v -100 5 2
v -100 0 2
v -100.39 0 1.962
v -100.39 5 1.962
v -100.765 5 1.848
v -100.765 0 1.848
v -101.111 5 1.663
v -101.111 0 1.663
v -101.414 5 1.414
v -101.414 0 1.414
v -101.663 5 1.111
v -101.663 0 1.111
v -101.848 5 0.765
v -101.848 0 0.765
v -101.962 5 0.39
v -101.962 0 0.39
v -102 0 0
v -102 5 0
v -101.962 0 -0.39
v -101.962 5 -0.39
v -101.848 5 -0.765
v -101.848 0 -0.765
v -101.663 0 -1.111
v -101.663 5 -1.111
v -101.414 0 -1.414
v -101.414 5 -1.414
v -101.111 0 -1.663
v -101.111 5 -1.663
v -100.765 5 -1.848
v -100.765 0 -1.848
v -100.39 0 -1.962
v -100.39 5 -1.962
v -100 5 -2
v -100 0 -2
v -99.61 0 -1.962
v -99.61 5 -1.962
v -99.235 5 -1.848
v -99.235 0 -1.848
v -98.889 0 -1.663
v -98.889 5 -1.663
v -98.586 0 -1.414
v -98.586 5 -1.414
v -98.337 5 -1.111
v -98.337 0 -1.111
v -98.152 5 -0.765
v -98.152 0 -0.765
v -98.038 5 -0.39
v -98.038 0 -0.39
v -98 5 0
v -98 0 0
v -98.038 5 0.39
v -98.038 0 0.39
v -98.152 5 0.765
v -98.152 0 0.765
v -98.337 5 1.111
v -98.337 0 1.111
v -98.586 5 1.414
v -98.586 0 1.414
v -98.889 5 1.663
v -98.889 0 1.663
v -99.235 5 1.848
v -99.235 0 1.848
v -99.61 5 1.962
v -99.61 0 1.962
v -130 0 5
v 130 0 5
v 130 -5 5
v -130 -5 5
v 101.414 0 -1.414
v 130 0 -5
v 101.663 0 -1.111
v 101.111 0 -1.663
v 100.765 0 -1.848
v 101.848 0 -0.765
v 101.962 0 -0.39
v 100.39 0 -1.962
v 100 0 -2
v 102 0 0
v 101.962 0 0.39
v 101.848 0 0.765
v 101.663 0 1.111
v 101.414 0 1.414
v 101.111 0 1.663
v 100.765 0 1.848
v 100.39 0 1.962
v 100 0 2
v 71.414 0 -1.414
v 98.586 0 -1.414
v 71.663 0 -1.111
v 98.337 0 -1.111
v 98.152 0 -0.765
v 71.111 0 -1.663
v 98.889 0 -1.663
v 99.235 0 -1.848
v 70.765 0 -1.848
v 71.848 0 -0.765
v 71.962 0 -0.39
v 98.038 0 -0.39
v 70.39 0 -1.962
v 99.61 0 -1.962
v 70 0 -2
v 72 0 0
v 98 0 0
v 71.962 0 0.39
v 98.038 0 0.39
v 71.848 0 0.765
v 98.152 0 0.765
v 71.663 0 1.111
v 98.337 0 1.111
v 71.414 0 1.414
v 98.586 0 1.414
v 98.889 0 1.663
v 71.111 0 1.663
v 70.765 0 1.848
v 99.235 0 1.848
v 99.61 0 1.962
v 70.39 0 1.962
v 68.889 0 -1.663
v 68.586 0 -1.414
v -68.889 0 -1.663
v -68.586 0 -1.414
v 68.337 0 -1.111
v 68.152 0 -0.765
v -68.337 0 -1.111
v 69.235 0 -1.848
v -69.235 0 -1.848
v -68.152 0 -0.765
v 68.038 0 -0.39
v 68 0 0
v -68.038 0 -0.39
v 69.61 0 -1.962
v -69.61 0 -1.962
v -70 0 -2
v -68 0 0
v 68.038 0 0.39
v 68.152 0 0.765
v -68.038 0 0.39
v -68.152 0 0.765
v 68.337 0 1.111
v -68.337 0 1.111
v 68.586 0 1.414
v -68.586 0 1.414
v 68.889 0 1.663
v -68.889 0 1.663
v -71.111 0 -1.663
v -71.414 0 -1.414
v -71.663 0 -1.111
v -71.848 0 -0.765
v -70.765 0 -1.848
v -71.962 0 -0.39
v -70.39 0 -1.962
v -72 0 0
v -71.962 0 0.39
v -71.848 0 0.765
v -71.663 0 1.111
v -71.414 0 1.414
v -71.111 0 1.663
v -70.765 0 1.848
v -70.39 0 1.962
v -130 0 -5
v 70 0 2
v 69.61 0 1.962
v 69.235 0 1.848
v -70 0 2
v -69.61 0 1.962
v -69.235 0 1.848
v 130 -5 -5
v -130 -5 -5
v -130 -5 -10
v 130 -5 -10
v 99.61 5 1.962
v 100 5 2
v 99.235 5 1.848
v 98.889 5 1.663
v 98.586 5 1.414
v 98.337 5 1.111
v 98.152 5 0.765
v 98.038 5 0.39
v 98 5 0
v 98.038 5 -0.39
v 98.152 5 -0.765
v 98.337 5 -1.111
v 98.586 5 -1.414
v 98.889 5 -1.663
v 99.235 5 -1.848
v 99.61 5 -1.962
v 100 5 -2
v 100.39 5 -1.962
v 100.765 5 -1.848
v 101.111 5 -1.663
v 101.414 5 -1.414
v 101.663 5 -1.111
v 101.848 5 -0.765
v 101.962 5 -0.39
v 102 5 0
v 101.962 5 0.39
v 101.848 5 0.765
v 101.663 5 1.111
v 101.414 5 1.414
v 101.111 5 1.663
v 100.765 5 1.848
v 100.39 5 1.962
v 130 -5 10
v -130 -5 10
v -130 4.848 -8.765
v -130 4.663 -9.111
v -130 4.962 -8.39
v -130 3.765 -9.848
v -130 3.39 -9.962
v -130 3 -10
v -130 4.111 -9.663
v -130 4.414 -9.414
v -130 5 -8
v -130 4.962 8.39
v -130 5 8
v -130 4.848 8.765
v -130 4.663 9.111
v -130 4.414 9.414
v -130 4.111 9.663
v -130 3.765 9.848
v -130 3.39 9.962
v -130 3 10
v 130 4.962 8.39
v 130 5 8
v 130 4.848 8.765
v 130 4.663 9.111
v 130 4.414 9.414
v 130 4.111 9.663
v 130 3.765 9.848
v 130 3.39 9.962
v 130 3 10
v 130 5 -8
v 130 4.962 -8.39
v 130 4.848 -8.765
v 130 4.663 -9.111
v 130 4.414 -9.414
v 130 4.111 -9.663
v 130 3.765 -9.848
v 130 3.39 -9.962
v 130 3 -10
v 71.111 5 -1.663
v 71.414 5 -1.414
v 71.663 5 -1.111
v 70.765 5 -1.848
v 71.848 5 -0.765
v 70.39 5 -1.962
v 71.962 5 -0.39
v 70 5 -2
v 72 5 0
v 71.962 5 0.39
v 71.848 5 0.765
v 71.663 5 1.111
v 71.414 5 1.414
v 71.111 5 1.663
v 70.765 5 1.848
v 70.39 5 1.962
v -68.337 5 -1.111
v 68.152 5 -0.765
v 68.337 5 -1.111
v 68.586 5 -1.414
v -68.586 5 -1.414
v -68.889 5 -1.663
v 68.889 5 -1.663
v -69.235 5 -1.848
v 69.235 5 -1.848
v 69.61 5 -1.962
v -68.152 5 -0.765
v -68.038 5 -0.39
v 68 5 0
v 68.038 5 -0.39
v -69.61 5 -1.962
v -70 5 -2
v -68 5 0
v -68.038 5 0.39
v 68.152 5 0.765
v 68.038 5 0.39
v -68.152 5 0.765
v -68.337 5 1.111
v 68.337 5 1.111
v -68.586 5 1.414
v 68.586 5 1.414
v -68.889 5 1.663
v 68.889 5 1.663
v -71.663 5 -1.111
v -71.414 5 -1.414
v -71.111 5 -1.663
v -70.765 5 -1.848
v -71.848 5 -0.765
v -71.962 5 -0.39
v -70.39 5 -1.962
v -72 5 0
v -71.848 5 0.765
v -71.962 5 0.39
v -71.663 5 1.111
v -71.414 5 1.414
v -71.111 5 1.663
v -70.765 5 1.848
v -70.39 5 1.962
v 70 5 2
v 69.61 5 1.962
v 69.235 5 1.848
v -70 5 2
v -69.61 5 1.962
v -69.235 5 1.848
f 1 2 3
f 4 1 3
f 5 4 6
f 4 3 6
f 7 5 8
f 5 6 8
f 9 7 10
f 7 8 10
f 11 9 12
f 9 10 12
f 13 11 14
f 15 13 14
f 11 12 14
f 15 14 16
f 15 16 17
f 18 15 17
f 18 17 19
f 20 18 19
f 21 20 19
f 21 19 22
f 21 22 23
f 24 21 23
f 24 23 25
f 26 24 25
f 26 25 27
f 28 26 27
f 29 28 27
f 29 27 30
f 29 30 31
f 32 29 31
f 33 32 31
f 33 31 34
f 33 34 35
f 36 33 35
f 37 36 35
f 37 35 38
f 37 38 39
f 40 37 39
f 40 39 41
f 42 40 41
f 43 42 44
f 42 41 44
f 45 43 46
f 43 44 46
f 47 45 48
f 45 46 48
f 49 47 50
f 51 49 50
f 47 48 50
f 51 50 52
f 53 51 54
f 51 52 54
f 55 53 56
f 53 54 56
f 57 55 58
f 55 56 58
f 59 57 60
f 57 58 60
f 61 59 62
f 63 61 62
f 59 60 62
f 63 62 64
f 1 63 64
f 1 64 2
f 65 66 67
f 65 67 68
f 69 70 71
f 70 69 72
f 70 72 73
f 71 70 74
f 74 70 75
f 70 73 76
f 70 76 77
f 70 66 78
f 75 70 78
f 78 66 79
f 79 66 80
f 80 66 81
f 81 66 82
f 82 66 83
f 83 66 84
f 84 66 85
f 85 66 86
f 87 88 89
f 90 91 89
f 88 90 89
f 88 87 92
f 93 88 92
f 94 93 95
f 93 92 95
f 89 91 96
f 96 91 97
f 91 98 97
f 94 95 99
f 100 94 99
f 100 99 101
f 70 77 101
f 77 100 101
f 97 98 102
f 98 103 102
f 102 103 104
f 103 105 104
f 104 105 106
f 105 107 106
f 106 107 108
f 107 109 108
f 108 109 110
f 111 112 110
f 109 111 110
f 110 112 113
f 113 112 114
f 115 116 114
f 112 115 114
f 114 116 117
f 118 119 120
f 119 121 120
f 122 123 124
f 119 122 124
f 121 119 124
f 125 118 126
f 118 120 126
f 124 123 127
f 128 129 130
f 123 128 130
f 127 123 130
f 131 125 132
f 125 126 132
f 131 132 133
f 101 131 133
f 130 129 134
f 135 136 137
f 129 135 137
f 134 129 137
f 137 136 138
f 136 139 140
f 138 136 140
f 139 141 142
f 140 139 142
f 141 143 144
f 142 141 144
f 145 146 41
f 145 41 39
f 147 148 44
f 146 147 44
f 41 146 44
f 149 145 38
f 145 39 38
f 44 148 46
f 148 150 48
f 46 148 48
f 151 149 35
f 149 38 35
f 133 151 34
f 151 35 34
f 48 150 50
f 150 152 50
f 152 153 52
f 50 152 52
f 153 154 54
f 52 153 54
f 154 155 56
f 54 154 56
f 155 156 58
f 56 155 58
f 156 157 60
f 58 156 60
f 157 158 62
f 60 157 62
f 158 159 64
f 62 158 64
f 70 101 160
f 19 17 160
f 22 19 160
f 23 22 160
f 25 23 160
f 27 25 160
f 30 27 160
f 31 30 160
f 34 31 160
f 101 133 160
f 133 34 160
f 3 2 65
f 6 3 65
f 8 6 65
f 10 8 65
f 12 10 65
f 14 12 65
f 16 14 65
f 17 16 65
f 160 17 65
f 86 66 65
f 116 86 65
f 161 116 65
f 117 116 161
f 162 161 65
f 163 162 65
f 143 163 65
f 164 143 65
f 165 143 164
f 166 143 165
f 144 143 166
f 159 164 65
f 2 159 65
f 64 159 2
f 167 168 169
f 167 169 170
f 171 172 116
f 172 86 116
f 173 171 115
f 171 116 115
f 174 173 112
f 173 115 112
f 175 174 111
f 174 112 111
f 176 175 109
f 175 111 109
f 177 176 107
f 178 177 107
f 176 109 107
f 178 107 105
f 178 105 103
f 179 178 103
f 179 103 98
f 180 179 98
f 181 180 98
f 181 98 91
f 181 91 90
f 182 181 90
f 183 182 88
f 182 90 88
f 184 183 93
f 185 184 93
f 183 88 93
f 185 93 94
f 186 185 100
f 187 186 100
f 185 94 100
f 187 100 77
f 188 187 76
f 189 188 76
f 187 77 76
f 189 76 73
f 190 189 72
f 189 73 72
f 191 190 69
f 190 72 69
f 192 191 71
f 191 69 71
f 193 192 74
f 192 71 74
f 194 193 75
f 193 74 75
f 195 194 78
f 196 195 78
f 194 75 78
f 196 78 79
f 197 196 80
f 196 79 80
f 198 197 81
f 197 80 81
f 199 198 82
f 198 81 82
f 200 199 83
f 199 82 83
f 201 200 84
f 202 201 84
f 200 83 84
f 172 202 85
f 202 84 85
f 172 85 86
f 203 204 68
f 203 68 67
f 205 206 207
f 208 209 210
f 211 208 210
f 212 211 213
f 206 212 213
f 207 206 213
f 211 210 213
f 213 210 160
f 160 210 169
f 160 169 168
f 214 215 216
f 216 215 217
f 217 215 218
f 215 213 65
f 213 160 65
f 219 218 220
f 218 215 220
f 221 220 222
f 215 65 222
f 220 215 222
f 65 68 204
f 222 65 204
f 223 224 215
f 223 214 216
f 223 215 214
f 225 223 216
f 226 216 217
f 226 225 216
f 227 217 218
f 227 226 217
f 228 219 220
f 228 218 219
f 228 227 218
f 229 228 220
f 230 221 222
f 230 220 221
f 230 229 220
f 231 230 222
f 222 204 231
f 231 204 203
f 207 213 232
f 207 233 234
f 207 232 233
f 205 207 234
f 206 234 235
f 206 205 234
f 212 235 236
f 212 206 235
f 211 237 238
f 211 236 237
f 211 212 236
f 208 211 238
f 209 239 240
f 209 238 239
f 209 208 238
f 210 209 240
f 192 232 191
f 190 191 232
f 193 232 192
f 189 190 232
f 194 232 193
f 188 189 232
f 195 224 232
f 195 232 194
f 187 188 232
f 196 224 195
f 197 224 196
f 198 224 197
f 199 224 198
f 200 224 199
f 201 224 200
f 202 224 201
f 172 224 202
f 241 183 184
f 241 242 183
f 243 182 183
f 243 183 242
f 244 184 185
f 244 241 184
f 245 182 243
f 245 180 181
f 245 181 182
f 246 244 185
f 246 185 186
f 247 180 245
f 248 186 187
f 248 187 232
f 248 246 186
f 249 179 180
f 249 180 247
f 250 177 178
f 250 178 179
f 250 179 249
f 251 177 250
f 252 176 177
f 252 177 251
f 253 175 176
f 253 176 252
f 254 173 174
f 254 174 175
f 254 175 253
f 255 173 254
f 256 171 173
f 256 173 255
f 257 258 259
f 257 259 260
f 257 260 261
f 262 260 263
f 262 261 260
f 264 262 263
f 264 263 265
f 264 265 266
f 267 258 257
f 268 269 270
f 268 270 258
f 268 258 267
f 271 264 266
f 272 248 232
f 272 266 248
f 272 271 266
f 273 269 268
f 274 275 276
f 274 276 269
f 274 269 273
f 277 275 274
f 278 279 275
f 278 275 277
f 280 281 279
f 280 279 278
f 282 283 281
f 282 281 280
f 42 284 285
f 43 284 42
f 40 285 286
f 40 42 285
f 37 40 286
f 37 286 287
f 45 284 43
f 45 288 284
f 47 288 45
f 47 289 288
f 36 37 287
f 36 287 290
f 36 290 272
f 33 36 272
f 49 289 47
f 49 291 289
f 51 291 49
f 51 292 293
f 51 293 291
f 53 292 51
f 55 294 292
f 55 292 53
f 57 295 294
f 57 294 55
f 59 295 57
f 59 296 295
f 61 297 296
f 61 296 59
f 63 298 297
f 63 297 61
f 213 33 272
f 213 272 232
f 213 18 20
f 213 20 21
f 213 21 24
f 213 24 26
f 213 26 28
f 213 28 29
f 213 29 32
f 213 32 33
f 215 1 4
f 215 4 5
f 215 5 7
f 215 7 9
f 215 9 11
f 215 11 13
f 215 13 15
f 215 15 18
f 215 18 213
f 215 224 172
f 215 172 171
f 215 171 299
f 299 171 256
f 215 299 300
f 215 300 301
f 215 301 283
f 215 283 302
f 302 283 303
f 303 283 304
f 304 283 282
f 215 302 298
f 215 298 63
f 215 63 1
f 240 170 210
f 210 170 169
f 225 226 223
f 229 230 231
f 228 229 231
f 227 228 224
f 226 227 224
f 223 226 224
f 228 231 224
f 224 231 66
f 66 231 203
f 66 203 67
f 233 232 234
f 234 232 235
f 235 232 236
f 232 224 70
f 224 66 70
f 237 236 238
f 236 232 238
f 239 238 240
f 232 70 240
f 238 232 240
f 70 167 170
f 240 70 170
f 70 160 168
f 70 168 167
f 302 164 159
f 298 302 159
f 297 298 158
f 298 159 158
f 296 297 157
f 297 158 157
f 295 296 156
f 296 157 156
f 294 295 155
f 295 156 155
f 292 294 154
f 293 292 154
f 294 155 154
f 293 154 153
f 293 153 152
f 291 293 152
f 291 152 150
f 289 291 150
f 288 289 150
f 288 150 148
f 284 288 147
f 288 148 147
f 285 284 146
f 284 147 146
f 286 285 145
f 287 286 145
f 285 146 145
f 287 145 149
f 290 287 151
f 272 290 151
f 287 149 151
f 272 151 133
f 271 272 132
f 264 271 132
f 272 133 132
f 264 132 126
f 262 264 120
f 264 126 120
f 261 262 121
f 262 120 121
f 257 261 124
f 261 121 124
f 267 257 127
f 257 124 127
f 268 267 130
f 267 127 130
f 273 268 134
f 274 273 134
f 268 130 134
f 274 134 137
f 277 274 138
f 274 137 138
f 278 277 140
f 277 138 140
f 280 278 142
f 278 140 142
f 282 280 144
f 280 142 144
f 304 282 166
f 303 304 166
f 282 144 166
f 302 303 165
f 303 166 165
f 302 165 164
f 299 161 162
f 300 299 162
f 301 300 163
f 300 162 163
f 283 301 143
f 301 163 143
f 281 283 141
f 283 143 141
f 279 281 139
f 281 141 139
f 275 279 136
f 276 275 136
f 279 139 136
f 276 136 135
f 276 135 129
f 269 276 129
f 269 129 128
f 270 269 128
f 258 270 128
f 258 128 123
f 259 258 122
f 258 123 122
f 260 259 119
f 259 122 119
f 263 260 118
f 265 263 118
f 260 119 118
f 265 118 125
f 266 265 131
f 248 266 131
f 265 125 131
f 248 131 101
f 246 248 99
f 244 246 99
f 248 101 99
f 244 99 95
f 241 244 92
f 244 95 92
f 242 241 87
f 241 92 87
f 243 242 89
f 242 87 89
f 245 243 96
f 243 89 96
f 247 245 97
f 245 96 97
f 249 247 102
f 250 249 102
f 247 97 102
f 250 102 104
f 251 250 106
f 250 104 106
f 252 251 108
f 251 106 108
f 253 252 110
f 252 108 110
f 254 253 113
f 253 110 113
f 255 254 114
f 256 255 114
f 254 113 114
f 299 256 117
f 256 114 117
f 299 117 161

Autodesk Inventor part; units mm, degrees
ref_plane "YZ Plane" through (0, 0, 0) normal (1, 0, 0) x (0, 1, 0)
ref_plane "XZ Plane" through (0, 0, 0) normal (0, 1, 0) x (-1, 0, 0)
ref_plane "XY Plane" through (0, 0, 0) normal (0, 0, 1) x (1, 0, 0)
sketch "Sketch2" plane through (0, 0, 0) normal (0, 1, 0) x (-1, 0, 0)
  line L0 (130, 10) -> (-130, 10)
  line L1 (-130, 10) -> (-130, -10)
  line L2 (-130, -10) -> (130, -10)
  line L3 (130, -10) -> (130, 10)
  line L4 (130, 10) -> (-130, -10) construction
  line L5 (-130, 10) -> (130, -10) construction
  point P0 (0, 0)
  dimension "d6" = 260
  dimension "d7" = 20
extrude "Extrusion2" add sketch "Sketch2" along normal blind 5
sketch "Sketch3" plane through (0, 0, 0) normal (0, -1, 0) x (1, 0, 0)
  line L0 (-130, -10) -> (-130, 10) projected
  line L1 (-130, 10) -> (130, 10)
  line L2 (130, 10) -> (130, 5)
  line L3 (130, 5) -> (-130, 5)
  line L4 (-130, 5) -> (-130, 10)
  line L5 (130, -10) -> (-130, -10) projected
  line L6 (130, -10) -> (-130, -10)
  line L7 (-130, -10) -> (-130, -5)
  line L8 (-130, -5) -> (130, -5)
  line L9 (130, -5) -> (130, -10)
  point P0 (0, 0)
  dimension "d10" = 260
  dimension "d11" = 5
  dimension "d13" = 5
extrude "Extrusion3" add sketch "Sketch3" along normal blind 5
fillet "Fillet1" radius 2 2 edges at (0, 5, 10) (0, 5, -10)
sketch "Sketch5" plane through (0, 5, 0) normal (0, 1, 0) x (1, 0, 0)
  point P0 (0, 0)
  point P1 (100, 0)
  point P2 (70, 0)
  point P3 (-70, 0)
  point P4 (-100, 0)
  dimension "d31" = 70
  dimension "d32" = 70
  dimension "d33" = 30
  dimension "d34" = 30
hole "Hole2" at (100, 5, 0) at (70, 5, 0) at (-70, 5, 0) at (-100, 5, 0) direction (0, -1, 0) diameter 4 end through all
properties part number "BASE_DE_PRUEBA"
